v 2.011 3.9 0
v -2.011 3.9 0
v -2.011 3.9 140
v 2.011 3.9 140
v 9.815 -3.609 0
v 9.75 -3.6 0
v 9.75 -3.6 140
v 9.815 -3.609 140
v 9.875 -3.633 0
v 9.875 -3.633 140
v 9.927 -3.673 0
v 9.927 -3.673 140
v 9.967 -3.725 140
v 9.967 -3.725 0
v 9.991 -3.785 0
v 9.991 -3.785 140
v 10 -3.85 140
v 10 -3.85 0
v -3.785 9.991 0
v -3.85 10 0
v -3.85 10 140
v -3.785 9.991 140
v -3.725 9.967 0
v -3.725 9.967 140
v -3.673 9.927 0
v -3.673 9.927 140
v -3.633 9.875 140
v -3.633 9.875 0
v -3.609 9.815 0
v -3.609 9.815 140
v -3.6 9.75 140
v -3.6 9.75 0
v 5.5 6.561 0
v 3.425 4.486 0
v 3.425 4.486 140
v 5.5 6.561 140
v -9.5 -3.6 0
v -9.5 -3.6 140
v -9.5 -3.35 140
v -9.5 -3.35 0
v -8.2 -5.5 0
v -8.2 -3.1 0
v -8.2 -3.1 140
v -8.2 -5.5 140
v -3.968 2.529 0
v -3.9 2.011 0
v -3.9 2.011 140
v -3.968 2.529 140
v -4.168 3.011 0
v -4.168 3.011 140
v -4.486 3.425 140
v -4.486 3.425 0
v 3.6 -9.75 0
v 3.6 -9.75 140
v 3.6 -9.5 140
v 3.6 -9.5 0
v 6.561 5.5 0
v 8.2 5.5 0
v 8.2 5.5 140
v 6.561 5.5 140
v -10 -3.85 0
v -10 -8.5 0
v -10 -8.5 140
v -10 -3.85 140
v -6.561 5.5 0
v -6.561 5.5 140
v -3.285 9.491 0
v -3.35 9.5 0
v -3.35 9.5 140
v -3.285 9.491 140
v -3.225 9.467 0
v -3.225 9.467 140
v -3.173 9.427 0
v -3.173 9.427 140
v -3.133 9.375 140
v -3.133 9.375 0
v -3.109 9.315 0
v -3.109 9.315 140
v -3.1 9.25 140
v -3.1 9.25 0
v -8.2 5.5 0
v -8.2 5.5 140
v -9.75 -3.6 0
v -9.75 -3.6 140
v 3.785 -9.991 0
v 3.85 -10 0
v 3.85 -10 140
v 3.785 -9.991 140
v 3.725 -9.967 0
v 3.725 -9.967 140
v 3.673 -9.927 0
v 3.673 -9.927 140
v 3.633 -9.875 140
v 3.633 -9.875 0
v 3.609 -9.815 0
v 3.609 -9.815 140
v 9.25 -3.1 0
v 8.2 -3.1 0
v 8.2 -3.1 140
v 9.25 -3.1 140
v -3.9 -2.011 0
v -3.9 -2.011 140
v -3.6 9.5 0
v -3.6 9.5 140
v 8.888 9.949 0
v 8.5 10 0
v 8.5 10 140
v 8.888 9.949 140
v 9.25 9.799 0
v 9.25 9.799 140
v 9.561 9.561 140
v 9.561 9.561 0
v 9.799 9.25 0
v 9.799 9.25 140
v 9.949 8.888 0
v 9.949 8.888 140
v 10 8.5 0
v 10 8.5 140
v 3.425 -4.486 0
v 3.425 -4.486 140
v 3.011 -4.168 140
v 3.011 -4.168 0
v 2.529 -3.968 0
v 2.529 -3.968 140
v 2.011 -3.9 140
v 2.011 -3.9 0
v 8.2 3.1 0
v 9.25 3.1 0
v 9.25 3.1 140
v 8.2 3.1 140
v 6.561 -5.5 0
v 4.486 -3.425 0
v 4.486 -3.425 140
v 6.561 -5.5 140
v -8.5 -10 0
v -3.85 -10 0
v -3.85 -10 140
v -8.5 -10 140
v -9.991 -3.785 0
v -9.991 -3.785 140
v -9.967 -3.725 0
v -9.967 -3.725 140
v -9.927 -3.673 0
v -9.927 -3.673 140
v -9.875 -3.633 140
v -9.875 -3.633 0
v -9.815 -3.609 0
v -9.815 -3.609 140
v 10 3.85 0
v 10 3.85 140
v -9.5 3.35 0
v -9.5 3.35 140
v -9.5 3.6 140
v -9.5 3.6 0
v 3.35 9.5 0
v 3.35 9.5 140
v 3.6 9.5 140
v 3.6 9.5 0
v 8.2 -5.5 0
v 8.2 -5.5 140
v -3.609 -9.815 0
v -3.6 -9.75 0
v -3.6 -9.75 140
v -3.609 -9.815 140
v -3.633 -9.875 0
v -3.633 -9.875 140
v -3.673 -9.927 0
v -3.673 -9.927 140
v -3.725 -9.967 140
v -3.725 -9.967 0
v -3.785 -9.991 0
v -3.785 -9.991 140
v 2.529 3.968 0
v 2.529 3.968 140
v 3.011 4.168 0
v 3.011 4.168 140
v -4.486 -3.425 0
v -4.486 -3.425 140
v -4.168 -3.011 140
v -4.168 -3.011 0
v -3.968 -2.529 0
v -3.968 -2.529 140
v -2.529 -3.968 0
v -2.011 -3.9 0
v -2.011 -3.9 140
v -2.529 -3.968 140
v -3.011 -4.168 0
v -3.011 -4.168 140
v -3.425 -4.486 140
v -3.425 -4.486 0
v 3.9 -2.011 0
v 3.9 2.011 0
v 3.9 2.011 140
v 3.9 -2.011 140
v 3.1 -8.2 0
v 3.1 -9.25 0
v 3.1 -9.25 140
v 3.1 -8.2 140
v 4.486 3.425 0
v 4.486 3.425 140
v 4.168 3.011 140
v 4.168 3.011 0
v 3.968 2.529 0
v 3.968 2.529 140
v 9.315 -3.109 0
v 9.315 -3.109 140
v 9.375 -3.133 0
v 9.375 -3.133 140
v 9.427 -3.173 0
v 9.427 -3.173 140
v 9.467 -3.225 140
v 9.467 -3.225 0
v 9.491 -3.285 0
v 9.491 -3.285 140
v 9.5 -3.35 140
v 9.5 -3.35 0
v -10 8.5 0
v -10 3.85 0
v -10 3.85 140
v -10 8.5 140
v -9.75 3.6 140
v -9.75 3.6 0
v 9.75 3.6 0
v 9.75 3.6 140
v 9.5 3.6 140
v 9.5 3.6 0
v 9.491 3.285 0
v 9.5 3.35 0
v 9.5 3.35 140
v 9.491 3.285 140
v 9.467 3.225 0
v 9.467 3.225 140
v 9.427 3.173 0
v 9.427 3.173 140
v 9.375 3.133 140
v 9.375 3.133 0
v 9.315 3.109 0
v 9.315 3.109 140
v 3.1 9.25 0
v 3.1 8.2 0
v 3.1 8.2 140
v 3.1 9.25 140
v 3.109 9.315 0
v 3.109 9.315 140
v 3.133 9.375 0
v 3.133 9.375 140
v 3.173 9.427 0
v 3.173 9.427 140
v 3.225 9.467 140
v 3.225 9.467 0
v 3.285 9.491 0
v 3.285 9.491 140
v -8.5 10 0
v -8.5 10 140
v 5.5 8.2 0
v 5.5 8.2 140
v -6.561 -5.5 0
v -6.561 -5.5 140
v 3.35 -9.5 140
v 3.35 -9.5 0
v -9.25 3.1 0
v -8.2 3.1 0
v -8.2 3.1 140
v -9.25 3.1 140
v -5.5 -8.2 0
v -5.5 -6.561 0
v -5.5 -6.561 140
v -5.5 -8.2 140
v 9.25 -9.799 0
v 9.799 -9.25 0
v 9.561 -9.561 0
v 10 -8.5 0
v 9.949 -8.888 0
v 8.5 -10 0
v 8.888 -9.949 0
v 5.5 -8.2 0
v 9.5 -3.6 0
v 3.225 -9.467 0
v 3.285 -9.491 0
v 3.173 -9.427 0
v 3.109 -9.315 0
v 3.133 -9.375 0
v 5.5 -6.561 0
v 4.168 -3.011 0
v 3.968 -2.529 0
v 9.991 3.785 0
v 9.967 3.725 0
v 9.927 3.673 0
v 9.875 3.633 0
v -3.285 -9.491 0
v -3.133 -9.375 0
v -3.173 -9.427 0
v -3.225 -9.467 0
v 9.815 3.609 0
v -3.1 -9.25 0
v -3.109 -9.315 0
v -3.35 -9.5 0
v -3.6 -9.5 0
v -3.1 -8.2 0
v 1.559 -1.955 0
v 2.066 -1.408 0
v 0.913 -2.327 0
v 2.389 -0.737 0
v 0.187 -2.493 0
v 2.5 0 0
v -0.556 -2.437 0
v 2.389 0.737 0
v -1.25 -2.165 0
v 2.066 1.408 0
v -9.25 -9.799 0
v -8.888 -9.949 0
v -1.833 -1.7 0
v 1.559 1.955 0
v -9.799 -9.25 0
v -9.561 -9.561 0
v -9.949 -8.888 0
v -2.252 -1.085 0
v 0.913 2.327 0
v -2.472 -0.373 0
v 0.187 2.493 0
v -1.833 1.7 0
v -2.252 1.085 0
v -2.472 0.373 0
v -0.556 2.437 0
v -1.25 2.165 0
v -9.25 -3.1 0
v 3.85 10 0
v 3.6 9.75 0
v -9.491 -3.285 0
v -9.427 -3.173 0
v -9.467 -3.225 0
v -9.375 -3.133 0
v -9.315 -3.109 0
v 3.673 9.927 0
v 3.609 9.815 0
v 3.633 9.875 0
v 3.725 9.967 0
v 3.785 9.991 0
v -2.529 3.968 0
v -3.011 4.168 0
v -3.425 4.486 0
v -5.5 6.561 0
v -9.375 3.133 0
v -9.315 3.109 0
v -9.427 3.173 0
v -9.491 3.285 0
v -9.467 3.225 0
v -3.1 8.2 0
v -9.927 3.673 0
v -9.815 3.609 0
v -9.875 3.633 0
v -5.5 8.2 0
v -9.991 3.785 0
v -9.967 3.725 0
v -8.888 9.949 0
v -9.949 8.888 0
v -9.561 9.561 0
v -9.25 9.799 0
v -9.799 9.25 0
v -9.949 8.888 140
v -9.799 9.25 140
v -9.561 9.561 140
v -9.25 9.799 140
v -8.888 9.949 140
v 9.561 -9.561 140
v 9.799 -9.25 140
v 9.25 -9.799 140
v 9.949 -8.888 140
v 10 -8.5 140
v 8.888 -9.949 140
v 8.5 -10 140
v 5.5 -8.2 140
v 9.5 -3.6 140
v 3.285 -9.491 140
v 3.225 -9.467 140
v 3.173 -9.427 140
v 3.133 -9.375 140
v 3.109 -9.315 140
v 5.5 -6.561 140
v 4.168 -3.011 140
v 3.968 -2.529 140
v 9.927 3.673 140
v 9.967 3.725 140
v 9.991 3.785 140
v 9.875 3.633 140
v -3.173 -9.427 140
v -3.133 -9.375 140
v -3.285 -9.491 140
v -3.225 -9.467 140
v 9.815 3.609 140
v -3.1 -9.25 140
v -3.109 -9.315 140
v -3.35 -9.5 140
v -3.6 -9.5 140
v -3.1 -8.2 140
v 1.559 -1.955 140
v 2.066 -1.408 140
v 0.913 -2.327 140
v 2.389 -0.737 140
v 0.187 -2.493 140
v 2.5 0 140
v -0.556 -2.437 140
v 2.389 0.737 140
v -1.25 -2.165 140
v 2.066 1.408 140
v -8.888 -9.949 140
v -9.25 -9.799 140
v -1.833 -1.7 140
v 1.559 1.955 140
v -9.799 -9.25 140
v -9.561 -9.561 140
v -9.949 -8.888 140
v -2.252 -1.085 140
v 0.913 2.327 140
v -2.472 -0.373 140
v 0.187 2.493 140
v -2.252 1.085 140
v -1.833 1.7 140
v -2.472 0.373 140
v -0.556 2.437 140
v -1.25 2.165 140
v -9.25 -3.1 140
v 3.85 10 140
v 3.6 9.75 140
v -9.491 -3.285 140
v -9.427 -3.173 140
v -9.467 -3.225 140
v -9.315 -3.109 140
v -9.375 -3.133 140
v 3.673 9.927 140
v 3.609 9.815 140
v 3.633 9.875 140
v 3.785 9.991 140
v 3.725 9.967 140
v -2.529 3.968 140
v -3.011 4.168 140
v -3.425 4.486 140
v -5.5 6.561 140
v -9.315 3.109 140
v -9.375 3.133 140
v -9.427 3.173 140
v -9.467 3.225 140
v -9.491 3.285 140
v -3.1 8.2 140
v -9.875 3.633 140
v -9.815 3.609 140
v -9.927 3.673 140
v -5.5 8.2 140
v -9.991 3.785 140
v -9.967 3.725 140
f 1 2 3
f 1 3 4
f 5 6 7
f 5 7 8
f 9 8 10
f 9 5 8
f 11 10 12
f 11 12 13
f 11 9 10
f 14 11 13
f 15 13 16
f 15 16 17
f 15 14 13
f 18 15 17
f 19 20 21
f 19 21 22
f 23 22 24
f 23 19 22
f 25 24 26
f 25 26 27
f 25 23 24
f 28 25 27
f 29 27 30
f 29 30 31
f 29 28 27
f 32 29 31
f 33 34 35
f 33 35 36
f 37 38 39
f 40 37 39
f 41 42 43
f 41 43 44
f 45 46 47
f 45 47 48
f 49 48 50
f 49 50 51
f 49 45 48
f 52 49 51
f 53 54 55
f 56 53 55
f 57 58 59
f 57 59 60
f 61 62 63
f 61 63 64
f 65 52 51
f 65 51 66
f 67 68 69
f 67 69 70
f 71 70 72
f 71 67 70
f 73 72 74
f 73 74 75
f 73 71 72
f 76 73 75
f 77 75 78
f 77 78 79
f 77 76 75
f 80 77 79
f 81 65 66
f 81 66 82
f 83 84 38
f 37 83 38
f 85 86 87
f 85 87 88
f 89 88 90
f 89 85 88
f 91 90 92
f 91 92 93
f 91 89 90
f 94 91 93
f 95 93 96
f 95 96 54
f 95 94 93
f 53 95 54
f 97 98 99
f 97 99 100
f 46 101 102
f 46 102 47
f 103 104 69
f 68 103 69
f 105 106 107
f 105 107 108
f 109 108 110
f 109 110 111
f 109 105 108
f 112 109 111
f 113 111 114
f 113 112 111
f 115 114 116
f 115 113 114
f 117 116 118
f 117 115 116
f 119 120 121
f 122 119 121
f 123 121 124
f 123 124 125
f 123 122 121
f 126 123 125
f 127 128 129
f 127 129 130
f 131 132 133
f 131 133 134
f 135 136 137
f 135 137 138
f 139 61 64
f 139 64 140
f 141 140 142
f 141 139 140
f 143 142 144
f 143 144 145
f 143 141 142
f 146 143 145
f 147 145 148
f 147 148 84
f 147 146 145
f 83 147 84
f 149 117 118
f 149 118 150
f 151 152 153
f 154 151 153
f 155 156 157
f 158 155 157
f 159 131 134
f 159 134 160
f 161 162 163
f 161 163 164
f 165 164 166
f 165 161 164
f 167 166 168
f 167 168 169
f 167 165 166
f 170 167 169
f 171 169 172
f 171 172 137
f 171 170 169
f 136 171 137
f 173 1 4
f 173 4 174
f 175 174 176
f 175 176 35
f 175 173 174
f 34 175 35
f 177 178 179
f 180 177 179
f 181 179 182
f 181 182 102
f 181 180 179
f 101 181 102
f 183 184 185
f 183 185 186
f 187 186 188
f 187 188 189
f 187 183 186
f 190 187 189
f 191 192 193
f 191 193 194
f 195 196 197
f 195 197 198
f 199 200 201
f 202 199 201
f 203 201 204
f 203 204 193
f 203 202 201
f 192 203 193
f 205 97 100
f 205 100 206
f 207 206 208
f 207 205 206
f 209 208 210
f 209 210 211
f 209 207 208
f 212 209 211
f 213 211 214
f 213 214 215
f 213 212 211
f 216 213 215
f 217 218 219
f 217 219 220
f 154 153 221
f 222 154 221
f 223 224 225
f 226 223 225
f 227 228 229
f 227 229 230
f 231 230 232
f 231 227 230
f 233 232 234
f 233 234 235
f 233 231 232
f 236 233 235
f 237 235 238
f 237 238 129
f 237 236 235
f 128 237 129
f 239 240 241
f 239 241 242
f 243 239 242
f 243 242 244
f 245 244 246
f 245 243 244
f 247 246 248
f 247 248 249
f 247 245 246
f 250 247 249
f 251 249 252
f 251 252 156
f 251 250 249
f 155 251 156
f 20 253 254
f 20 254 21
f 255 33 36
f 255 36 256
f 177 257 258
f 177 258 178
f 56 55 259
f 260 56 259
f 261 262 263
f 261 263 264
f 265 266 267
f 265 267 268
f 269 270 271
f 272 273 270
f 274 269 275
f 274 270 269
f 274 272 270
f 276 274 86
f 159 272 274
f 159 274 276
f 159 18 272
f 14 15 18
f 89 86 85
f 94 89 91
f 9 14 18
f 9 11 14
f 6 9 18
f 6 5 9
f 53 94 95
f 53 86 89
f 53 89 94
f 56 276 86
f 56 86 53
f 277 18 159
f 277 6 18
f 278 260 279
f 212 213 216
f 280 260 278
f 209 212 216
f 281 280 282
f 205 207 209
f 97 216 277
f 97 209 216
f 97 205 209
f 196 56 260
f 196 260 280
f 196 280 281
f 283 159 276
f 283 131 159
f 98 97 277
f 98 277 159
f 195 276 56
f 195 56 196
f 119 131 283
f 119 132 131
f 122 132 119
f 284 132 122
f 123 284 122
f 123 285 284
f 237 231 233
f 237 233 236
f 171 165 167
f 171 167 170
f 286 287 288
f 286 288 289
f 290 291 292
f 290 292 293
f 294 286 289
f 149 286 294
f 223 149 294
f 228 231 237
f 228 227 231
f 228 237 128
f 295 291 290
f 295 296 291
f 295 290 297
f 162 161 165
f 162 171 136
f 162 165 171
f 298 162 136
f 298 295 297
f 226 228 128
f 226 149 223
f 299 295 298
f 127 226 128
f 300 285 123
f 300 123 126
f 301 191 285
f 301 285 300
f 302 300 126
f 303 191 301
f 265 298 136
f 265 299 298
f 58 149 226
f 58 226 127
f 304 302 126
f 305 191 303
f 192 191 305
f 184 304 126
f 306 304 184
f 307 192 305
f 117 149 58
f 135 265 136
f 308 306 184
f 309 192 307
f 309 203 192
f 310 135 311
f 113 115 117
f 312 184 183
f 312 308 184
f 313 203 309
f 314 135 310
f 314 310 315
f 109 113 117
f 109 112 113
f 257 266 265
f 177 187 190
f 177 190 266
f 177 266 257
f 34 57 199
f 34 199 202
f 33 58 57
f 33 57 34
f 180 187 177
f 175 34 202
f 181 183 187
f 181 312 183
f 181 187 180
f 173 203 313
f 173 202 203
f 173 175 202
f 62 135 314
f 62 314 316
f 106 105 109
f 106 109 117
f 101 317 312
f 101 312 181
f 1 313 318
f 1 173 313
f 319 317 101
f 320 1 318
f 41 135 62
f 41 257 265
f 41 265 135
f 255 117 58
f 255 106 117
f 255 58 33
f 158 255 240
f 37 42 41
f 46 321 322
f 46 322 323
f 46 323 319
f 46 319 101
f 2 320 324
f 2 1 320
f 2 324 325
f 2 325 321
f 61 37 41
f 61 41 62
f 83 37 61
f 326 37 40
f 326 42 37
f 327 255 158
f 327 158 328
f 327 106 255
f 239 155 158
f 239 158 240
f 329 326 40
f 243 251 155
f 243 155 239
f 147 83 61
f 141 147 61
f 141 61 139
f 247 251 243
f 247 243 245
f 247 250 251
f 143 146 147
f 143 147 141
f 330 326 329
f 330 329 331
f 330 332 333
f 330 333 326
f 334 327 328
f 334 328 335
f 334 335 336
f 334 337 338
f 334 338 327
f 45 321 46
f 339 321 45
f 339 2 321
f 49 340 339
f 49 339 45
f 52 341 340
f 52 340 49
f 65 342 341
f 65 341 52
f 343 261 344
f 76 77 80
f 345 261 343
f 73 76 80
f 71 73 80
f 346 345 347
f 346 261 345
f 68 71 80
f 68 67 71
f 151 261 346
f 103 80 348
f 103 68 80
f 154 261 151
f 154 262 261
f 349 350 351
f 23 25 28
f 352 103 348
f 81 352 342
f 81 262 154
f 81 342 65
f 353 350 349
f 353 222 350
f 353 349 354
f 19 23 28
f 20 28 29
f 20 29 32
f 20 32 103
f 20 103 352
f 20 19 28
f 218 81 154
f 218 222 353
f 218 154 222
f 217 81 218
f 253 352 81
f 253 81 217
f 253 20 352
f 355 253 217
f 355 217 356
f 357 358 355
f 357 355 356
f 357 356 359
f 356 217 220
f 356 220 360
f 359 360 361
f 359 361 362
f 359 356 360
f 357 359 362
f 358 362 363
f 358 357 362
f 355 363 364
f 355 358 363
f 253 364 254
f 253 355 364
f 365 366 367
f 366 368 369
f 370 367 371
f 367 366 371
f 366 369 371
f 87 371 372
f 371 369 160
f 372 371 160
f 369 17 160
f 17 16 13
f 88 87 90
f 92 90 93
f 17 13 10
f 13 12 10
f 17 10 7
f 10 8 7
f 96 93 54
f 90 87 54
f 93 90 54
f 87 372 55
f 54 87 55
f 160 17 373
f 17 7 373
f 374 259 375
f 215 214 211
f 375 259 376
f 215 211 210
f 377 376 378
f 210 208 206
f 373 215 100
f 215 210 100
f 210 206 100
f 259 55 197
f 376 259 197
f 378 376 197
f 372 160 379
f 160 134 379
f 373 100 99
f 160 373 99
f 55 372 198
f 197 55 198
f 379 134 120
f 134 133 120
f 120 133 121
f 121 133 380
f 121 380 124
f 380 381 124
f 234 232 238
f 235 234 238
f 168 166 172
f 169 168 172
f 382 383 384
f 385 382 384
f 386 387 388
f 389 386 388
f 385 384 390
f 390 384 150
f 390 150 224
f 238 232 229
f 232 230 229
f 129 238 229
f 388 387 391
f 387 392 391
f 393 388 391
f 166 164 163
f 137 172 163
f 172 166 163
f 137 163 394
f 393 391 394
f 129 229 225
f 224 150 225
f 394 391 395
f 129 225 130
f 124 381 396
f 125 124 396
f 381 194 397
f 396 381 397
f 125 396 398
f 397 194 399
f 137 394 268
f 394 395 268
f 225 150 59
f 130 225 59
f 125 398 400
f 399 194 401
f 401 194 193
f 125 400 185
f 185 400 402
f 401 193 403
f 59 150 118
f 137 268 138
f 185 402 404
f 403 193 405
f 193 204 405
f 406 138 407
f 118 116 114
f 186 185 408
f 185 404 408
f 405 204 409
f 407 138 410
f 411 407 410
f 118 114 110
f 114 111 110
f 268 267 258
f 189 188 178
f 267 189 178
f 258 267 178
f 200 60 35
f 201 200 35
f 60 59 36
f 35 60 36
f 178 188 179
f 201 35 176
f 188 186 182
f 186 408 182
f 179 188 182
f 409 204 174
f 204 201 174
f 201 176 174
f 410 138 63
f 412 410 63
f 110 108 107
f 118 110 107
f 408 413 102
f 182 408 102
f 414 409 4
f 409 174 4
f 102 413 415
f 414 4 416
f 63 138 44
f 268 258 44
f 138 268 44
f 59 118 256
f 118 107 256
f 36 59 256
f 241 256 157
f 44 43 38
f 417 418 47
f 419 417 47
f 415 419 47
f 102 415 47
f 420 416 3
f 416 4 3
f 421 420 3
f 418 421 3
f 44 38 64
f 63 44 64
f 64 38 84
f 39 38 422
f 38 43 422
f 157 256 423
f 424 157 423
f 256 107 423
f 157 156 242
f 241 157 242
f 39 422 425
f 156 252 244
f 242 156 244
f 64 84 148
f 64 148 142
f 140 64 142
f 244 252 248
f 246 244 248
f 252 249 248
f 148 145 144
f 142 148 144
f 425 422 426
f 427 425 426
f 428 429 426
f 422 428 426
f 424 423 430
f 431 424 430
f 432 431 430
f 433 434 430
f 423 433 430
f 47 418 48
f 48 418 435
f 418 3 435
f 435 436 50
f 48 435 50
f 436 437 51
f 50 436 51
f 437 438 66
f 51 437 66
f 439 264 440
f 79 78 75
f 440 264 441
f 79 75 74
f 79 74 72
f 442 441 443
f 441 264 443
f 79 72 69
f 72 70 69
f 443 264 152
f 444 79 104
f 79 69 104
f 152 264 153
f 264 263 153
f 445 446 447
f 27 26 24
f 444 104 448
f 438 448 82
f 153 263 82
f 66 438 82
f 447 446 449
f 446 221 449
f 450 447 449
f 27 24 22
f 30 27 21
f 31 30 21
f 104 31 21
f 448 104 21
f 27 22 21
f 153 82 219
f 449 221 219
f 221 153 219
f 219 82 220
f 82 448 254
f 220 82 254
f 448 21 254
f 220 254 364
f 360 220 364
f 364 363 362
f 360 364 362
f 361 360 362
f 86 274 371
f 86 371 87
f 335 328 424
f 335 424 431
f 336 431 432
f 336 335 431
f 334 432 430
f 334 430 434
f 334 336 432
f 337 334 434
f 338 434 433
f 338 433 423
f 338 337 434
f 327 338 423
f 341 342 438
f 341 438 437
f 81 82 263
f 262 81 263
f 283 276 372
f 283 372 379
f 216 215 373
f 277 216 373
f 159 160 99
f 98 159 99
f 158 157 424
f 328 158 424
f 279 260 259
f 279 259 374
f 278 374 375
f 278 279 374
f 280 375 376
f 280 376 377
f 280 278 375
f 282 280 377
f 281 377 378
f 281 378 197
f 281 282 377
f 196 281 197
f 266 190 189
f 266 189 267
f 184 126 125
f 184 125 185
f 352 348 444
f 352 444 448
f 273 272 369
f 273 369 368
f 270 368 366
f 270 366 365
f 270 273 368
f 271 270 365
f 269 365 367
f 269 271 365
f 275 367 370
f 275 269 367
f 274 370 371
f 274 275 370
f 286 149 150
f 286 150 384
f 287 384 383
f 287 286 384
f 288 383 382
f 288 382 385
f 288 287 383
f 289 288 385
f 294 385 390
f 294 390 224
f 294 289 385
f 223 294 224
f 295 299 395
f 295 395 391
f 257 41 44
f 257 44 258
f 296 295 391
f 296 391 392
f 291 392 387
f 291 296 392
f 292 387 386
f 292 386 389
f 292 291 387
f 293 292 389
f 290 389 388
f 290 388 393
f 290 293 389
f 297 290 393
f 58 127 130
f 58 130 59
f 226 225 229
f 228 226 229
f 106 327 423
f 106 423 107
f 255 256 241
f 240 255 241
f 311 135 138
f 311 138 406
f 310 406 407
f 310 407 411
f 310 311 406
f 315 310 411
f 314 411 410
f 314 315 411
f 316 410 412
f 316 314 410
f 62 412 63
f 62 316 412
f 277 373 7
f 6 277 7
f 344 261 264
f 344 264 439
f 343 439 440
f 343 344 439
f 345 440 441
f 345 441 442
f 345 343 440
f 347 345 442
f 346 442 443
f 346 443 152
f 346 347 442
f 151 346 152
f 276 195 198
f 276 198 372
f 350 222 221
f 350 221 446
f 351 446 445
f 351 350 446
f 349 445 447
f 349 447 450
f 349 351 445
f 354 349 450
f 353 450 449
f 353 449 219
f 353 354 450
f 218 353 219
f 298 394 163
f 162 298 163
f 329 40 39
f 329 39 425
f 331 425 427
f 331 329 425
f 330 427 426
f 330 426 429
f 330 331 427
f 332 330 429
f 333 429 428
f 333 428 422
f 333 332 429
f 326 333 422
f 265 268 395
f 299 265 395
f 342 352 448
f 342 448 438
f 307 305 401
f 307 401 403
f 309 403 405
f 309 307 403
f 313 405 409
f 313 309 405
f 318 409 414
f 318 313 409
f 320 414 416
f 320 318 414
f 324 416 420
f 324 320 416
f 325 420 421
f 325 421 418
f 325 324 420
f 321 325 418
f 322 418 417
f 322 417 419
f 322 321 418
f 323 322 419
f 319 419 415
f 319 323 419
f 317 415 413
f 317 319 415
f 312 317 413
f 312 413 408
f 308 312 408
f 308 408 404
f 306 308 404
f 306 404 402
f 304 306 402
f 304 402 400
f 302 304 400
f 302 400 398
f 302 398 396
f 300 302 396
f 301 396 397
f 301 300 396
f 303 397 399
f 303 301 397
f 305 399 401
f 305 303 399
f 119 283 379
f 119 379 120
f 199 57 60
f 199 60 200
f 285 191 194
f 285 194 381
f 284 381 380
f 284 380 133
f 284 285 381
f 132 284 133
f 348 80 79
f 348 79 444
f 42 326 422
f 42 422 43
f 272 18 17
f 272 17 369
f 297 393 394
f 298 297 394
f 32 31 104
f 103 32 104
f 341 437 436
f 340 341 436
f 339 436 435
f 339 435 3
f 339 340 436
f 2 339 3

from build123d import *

# Parameters (mm, degrees)
SKETCH1_R           = 2.5
BOSS_EXTRUDE1_DEPTH = 140


with BuildPart() as part:
    # Sketch1 → Boss-Extrude1 (new body)
    with BuildSketch(Plane.XY):
        with BuildLine():
            Line((-8.5, 10), (-3.85, 10))
            ThreePointArc((-3.85, 10), (-3.673223305, 9.926776695), (-3.6, 9.75))
            Line((-3.6, 9.75), (-3.6, 9.5))
            Line((-3.6, 9.5), (-3.35, 9.5))
            ThreePointArc((-3.35, 9.5), (-3.173223305, 9.426776695), (-3.1, 9.25))
            Line((-3.1, 9.25), (-3.1, 8.2))
            Line((-3.1, 8.2), (-5.5, 8.2))
            Line((-5.5, 8.2), (-5.5, 6.560660172))
            Line((-5.5, 6.560660172), (-3.425126266, 4.485786438))
            ThreePointArc((-3.425126266, 4.485786438), (-2.776279568, 4.052240935), (-2.010912703, 3.9))
            Line((-2.010912703, 3.9), (2.010912703, 3.9))
            ThreePointArc((2.010912703, 3.9), (2.776279568, 4.052240935), (3.425126266, 4.485786438))
            Line((3.425126266, 4.485786438), (5.5, 6.560660172))
            Line((5.5, 6.560660172), (5.5, 8.2))
            Line((5.5, 8.2), (3.1, 8.2))
            Line((3.1, 8.2), (3.1, 9.25))
            ThreePointArc((3.1, 9.25), (3.173223305, 9.426776695), (3.35, 9.5))
            Line((3.35, 9.5), (3.6, 9.5))
            Line((3.6, 9.5), (3.6, 9.75))
            ThreePointArc((3.6, 9.75), (3.673223305, 9.926776695), (3.85, 10))
            Line((3.85, 10), (8.5, 10))
            ThreePointArc((8.5, 10), (9.560660172, 9.560660172), (10, 8.5))
            Line((10, 8.5), (10, 3.85))
            ThreePointArc((10, 3.85), (9.926776695, 3.673223305), (9.75, 3.6))
            Line((9.75, 3.6), (9.5, 3.6))
            Line((9.5, 3.6), (9.5, 3.35))
            ThreePointArc((9.5, 3.35), (9.426776695, 3.173223305), (9.25, 3.1))
            Line((9.25, 3.1), (8.2, 3.1))
            Line((8.2, 3.1), (8.2, 5.5))
            Line((8.2, 5.5), (6.560660172, 5.5))
            Line((6.560660172, 5.5), (4.485786438, 3.425126266))
            ThreePointArc((4.485786438, 3.425126266), (4.052240935, 2.776279568), (3.9, 2.010912703))
            Line((3.9, 2.010912703), (3.9, -2.010912703))
            ThreePointArc((3.9, -2.010912703), (4.052240935, -2.776279568), (4.485786438, -3.425126266))
            Line((4.485786438, -3.425126266), (6.560660172, -5.5))
            Line((6.560660172, -5.5), (8.2, -5.5))
            Line((8.2, -5.5), (8.2, -3.1))
            Line((8.2, -3.1), (9.25, -3.1))
            ThreePointArc((9.25, -3.1), (9.426776695, -3.173223305), (9.5, -3.35))
            Line((9.5, -3.35), (9.5, -3.6))
            Line((9.5, -3.6), (9.75, -3.6))
            ThreePointArc((9.75, -3.6), (9.926776695, -3.673223305), (10, -3.85))
            Line((10, -3.85), (10, -8.5))
            ThreePointArc((10, -8.5), (9.560660172, -9.560660172), (8.5, -10))
            Line((8.5, -10), (3.85, -10))
            ThreePointArc((3.85, -10), (3.673223305, -9.926776695), (3.6, -9.75))
            Line((3.6, -9.75), (3.6, -9.5))
            Line((3.6, -9.5), (3.35, -9.5))
            ThreePointArc((3.35, -9.5), (3.173223305, -9.426776695), (3.1, -9.25))
            Line((3.1, -9.25), (3.1, -8.2))
            Line((3.1, -8.2), (5.5, -8.2))
            Line((5.5, -8.2), (5.5, -6.560660172))
            Line((5.5, -6.560660172), (3.425126266, -4.485786438))
            ThreePointArc((3.425126266, -4.485786438), (2.776279568, -4.052240935), (2.010912703, -3.9))
            Line((2.010912703, -3.9), (-2.010912703, -3.9))
            ThreePointArc((-2.010912703, -3.9), (-2.776279568, -4.052240935), (-3.425126266, -4.485786438))
            Line((-3.425126266, -4.485786438), (-5.5, -6.560660172))
            Line((-5.5, -6.560660172), (-5.5, -8.2))
            Line((-5.5, -8.2), (-3.1, -8.2))
            Line((-3.1, -8.2), (-3.1, -9.25))
            ThreePointArc((-3.1, -9.25), (-3.173223305, -9.426776695), (-3.35, -9.5))
            Line((-3.35, -9.5), (-3.6, -9.5))
            Line((-3.6, -9.5), (-3.6, -9.75))
            ThreePointArc((-3.6, -9.75), (-3.673223305, -9.926776695), (-3.85, -10))
            Line((-3.85, -10), (-8.5, -10))
            ThreePointArc((-8.5, -10), (-9.560660172, -9.560660172), (-10, -8.5))
            Line((-10, -8.5), (-10, -3.85))
            ThreePointArc((-10, -3.85), (-9.926776695, -3.673223305), (-9.75, -3.6))
            Line((-9.75, -3.6), (-9.5, -3.6))
            Line((-9.5, -3.6), (-9.5, -3.35))
            ThreePointArc((-9.5, -3.35), (-9.426776695, -3.173223305), (-9.25, -3.1))
            Line((-9.25, -3.1), (-8.2, -3.1))
            Line((-8.2, -3.1), (-8.2, -5.5))
            Line((-8.2, -5.5), (-6.560660172, -5.5))
            Line((-6.560660172, -5.5), (-4.485786438, -3.425126266))
            ThreePointArc((-4.485786438, -3.425126266), (-4.052240935, -2.776279568), (-3.9, -2.010912703))
            Line((-3.9, -2.010912703), (-3.9, 2.010912703))
            ThreePointArc((-3.9, 2.010912703), (-4.052240935, 2.776279568), (-4.485786438, 3.425126266))
            Line((-4.485786438, 3.425126266), (-6.560660172, 5.5))
            Line((-6.560660172, 5.5), (-8.2, 5.5))
            Line((-8.2, 5.5), (-8.2, 3.1))
            Line((-8.2, 3.1), (-9.25, 3.1))
            ThreePointArc((-9.25, 3.1), (-9.426776695, 3.173223305), (-9.5, 3.35))
            Line((-9.5, 3.35), (-9.5, 3.6))
            Line((-9.5, 3.6), (-9.75, 3.6))
            ThreePointArc((-9.75, 3.6), (-9.926776695, 3.673223305), (-10, 3.85))
            Line((-10, 3.85), (-10, 8.5))
            ThreePointArc((-10, 8.5), (-9.560660172, 9.560660172), (-8.5, 10))
        make_face()
        Circle(SKETCH1_R, mode=Mode.SUBTRACT)
    extrude(amount=BOSS_EXTRUDE1_DEPTH)


solid = part.part
